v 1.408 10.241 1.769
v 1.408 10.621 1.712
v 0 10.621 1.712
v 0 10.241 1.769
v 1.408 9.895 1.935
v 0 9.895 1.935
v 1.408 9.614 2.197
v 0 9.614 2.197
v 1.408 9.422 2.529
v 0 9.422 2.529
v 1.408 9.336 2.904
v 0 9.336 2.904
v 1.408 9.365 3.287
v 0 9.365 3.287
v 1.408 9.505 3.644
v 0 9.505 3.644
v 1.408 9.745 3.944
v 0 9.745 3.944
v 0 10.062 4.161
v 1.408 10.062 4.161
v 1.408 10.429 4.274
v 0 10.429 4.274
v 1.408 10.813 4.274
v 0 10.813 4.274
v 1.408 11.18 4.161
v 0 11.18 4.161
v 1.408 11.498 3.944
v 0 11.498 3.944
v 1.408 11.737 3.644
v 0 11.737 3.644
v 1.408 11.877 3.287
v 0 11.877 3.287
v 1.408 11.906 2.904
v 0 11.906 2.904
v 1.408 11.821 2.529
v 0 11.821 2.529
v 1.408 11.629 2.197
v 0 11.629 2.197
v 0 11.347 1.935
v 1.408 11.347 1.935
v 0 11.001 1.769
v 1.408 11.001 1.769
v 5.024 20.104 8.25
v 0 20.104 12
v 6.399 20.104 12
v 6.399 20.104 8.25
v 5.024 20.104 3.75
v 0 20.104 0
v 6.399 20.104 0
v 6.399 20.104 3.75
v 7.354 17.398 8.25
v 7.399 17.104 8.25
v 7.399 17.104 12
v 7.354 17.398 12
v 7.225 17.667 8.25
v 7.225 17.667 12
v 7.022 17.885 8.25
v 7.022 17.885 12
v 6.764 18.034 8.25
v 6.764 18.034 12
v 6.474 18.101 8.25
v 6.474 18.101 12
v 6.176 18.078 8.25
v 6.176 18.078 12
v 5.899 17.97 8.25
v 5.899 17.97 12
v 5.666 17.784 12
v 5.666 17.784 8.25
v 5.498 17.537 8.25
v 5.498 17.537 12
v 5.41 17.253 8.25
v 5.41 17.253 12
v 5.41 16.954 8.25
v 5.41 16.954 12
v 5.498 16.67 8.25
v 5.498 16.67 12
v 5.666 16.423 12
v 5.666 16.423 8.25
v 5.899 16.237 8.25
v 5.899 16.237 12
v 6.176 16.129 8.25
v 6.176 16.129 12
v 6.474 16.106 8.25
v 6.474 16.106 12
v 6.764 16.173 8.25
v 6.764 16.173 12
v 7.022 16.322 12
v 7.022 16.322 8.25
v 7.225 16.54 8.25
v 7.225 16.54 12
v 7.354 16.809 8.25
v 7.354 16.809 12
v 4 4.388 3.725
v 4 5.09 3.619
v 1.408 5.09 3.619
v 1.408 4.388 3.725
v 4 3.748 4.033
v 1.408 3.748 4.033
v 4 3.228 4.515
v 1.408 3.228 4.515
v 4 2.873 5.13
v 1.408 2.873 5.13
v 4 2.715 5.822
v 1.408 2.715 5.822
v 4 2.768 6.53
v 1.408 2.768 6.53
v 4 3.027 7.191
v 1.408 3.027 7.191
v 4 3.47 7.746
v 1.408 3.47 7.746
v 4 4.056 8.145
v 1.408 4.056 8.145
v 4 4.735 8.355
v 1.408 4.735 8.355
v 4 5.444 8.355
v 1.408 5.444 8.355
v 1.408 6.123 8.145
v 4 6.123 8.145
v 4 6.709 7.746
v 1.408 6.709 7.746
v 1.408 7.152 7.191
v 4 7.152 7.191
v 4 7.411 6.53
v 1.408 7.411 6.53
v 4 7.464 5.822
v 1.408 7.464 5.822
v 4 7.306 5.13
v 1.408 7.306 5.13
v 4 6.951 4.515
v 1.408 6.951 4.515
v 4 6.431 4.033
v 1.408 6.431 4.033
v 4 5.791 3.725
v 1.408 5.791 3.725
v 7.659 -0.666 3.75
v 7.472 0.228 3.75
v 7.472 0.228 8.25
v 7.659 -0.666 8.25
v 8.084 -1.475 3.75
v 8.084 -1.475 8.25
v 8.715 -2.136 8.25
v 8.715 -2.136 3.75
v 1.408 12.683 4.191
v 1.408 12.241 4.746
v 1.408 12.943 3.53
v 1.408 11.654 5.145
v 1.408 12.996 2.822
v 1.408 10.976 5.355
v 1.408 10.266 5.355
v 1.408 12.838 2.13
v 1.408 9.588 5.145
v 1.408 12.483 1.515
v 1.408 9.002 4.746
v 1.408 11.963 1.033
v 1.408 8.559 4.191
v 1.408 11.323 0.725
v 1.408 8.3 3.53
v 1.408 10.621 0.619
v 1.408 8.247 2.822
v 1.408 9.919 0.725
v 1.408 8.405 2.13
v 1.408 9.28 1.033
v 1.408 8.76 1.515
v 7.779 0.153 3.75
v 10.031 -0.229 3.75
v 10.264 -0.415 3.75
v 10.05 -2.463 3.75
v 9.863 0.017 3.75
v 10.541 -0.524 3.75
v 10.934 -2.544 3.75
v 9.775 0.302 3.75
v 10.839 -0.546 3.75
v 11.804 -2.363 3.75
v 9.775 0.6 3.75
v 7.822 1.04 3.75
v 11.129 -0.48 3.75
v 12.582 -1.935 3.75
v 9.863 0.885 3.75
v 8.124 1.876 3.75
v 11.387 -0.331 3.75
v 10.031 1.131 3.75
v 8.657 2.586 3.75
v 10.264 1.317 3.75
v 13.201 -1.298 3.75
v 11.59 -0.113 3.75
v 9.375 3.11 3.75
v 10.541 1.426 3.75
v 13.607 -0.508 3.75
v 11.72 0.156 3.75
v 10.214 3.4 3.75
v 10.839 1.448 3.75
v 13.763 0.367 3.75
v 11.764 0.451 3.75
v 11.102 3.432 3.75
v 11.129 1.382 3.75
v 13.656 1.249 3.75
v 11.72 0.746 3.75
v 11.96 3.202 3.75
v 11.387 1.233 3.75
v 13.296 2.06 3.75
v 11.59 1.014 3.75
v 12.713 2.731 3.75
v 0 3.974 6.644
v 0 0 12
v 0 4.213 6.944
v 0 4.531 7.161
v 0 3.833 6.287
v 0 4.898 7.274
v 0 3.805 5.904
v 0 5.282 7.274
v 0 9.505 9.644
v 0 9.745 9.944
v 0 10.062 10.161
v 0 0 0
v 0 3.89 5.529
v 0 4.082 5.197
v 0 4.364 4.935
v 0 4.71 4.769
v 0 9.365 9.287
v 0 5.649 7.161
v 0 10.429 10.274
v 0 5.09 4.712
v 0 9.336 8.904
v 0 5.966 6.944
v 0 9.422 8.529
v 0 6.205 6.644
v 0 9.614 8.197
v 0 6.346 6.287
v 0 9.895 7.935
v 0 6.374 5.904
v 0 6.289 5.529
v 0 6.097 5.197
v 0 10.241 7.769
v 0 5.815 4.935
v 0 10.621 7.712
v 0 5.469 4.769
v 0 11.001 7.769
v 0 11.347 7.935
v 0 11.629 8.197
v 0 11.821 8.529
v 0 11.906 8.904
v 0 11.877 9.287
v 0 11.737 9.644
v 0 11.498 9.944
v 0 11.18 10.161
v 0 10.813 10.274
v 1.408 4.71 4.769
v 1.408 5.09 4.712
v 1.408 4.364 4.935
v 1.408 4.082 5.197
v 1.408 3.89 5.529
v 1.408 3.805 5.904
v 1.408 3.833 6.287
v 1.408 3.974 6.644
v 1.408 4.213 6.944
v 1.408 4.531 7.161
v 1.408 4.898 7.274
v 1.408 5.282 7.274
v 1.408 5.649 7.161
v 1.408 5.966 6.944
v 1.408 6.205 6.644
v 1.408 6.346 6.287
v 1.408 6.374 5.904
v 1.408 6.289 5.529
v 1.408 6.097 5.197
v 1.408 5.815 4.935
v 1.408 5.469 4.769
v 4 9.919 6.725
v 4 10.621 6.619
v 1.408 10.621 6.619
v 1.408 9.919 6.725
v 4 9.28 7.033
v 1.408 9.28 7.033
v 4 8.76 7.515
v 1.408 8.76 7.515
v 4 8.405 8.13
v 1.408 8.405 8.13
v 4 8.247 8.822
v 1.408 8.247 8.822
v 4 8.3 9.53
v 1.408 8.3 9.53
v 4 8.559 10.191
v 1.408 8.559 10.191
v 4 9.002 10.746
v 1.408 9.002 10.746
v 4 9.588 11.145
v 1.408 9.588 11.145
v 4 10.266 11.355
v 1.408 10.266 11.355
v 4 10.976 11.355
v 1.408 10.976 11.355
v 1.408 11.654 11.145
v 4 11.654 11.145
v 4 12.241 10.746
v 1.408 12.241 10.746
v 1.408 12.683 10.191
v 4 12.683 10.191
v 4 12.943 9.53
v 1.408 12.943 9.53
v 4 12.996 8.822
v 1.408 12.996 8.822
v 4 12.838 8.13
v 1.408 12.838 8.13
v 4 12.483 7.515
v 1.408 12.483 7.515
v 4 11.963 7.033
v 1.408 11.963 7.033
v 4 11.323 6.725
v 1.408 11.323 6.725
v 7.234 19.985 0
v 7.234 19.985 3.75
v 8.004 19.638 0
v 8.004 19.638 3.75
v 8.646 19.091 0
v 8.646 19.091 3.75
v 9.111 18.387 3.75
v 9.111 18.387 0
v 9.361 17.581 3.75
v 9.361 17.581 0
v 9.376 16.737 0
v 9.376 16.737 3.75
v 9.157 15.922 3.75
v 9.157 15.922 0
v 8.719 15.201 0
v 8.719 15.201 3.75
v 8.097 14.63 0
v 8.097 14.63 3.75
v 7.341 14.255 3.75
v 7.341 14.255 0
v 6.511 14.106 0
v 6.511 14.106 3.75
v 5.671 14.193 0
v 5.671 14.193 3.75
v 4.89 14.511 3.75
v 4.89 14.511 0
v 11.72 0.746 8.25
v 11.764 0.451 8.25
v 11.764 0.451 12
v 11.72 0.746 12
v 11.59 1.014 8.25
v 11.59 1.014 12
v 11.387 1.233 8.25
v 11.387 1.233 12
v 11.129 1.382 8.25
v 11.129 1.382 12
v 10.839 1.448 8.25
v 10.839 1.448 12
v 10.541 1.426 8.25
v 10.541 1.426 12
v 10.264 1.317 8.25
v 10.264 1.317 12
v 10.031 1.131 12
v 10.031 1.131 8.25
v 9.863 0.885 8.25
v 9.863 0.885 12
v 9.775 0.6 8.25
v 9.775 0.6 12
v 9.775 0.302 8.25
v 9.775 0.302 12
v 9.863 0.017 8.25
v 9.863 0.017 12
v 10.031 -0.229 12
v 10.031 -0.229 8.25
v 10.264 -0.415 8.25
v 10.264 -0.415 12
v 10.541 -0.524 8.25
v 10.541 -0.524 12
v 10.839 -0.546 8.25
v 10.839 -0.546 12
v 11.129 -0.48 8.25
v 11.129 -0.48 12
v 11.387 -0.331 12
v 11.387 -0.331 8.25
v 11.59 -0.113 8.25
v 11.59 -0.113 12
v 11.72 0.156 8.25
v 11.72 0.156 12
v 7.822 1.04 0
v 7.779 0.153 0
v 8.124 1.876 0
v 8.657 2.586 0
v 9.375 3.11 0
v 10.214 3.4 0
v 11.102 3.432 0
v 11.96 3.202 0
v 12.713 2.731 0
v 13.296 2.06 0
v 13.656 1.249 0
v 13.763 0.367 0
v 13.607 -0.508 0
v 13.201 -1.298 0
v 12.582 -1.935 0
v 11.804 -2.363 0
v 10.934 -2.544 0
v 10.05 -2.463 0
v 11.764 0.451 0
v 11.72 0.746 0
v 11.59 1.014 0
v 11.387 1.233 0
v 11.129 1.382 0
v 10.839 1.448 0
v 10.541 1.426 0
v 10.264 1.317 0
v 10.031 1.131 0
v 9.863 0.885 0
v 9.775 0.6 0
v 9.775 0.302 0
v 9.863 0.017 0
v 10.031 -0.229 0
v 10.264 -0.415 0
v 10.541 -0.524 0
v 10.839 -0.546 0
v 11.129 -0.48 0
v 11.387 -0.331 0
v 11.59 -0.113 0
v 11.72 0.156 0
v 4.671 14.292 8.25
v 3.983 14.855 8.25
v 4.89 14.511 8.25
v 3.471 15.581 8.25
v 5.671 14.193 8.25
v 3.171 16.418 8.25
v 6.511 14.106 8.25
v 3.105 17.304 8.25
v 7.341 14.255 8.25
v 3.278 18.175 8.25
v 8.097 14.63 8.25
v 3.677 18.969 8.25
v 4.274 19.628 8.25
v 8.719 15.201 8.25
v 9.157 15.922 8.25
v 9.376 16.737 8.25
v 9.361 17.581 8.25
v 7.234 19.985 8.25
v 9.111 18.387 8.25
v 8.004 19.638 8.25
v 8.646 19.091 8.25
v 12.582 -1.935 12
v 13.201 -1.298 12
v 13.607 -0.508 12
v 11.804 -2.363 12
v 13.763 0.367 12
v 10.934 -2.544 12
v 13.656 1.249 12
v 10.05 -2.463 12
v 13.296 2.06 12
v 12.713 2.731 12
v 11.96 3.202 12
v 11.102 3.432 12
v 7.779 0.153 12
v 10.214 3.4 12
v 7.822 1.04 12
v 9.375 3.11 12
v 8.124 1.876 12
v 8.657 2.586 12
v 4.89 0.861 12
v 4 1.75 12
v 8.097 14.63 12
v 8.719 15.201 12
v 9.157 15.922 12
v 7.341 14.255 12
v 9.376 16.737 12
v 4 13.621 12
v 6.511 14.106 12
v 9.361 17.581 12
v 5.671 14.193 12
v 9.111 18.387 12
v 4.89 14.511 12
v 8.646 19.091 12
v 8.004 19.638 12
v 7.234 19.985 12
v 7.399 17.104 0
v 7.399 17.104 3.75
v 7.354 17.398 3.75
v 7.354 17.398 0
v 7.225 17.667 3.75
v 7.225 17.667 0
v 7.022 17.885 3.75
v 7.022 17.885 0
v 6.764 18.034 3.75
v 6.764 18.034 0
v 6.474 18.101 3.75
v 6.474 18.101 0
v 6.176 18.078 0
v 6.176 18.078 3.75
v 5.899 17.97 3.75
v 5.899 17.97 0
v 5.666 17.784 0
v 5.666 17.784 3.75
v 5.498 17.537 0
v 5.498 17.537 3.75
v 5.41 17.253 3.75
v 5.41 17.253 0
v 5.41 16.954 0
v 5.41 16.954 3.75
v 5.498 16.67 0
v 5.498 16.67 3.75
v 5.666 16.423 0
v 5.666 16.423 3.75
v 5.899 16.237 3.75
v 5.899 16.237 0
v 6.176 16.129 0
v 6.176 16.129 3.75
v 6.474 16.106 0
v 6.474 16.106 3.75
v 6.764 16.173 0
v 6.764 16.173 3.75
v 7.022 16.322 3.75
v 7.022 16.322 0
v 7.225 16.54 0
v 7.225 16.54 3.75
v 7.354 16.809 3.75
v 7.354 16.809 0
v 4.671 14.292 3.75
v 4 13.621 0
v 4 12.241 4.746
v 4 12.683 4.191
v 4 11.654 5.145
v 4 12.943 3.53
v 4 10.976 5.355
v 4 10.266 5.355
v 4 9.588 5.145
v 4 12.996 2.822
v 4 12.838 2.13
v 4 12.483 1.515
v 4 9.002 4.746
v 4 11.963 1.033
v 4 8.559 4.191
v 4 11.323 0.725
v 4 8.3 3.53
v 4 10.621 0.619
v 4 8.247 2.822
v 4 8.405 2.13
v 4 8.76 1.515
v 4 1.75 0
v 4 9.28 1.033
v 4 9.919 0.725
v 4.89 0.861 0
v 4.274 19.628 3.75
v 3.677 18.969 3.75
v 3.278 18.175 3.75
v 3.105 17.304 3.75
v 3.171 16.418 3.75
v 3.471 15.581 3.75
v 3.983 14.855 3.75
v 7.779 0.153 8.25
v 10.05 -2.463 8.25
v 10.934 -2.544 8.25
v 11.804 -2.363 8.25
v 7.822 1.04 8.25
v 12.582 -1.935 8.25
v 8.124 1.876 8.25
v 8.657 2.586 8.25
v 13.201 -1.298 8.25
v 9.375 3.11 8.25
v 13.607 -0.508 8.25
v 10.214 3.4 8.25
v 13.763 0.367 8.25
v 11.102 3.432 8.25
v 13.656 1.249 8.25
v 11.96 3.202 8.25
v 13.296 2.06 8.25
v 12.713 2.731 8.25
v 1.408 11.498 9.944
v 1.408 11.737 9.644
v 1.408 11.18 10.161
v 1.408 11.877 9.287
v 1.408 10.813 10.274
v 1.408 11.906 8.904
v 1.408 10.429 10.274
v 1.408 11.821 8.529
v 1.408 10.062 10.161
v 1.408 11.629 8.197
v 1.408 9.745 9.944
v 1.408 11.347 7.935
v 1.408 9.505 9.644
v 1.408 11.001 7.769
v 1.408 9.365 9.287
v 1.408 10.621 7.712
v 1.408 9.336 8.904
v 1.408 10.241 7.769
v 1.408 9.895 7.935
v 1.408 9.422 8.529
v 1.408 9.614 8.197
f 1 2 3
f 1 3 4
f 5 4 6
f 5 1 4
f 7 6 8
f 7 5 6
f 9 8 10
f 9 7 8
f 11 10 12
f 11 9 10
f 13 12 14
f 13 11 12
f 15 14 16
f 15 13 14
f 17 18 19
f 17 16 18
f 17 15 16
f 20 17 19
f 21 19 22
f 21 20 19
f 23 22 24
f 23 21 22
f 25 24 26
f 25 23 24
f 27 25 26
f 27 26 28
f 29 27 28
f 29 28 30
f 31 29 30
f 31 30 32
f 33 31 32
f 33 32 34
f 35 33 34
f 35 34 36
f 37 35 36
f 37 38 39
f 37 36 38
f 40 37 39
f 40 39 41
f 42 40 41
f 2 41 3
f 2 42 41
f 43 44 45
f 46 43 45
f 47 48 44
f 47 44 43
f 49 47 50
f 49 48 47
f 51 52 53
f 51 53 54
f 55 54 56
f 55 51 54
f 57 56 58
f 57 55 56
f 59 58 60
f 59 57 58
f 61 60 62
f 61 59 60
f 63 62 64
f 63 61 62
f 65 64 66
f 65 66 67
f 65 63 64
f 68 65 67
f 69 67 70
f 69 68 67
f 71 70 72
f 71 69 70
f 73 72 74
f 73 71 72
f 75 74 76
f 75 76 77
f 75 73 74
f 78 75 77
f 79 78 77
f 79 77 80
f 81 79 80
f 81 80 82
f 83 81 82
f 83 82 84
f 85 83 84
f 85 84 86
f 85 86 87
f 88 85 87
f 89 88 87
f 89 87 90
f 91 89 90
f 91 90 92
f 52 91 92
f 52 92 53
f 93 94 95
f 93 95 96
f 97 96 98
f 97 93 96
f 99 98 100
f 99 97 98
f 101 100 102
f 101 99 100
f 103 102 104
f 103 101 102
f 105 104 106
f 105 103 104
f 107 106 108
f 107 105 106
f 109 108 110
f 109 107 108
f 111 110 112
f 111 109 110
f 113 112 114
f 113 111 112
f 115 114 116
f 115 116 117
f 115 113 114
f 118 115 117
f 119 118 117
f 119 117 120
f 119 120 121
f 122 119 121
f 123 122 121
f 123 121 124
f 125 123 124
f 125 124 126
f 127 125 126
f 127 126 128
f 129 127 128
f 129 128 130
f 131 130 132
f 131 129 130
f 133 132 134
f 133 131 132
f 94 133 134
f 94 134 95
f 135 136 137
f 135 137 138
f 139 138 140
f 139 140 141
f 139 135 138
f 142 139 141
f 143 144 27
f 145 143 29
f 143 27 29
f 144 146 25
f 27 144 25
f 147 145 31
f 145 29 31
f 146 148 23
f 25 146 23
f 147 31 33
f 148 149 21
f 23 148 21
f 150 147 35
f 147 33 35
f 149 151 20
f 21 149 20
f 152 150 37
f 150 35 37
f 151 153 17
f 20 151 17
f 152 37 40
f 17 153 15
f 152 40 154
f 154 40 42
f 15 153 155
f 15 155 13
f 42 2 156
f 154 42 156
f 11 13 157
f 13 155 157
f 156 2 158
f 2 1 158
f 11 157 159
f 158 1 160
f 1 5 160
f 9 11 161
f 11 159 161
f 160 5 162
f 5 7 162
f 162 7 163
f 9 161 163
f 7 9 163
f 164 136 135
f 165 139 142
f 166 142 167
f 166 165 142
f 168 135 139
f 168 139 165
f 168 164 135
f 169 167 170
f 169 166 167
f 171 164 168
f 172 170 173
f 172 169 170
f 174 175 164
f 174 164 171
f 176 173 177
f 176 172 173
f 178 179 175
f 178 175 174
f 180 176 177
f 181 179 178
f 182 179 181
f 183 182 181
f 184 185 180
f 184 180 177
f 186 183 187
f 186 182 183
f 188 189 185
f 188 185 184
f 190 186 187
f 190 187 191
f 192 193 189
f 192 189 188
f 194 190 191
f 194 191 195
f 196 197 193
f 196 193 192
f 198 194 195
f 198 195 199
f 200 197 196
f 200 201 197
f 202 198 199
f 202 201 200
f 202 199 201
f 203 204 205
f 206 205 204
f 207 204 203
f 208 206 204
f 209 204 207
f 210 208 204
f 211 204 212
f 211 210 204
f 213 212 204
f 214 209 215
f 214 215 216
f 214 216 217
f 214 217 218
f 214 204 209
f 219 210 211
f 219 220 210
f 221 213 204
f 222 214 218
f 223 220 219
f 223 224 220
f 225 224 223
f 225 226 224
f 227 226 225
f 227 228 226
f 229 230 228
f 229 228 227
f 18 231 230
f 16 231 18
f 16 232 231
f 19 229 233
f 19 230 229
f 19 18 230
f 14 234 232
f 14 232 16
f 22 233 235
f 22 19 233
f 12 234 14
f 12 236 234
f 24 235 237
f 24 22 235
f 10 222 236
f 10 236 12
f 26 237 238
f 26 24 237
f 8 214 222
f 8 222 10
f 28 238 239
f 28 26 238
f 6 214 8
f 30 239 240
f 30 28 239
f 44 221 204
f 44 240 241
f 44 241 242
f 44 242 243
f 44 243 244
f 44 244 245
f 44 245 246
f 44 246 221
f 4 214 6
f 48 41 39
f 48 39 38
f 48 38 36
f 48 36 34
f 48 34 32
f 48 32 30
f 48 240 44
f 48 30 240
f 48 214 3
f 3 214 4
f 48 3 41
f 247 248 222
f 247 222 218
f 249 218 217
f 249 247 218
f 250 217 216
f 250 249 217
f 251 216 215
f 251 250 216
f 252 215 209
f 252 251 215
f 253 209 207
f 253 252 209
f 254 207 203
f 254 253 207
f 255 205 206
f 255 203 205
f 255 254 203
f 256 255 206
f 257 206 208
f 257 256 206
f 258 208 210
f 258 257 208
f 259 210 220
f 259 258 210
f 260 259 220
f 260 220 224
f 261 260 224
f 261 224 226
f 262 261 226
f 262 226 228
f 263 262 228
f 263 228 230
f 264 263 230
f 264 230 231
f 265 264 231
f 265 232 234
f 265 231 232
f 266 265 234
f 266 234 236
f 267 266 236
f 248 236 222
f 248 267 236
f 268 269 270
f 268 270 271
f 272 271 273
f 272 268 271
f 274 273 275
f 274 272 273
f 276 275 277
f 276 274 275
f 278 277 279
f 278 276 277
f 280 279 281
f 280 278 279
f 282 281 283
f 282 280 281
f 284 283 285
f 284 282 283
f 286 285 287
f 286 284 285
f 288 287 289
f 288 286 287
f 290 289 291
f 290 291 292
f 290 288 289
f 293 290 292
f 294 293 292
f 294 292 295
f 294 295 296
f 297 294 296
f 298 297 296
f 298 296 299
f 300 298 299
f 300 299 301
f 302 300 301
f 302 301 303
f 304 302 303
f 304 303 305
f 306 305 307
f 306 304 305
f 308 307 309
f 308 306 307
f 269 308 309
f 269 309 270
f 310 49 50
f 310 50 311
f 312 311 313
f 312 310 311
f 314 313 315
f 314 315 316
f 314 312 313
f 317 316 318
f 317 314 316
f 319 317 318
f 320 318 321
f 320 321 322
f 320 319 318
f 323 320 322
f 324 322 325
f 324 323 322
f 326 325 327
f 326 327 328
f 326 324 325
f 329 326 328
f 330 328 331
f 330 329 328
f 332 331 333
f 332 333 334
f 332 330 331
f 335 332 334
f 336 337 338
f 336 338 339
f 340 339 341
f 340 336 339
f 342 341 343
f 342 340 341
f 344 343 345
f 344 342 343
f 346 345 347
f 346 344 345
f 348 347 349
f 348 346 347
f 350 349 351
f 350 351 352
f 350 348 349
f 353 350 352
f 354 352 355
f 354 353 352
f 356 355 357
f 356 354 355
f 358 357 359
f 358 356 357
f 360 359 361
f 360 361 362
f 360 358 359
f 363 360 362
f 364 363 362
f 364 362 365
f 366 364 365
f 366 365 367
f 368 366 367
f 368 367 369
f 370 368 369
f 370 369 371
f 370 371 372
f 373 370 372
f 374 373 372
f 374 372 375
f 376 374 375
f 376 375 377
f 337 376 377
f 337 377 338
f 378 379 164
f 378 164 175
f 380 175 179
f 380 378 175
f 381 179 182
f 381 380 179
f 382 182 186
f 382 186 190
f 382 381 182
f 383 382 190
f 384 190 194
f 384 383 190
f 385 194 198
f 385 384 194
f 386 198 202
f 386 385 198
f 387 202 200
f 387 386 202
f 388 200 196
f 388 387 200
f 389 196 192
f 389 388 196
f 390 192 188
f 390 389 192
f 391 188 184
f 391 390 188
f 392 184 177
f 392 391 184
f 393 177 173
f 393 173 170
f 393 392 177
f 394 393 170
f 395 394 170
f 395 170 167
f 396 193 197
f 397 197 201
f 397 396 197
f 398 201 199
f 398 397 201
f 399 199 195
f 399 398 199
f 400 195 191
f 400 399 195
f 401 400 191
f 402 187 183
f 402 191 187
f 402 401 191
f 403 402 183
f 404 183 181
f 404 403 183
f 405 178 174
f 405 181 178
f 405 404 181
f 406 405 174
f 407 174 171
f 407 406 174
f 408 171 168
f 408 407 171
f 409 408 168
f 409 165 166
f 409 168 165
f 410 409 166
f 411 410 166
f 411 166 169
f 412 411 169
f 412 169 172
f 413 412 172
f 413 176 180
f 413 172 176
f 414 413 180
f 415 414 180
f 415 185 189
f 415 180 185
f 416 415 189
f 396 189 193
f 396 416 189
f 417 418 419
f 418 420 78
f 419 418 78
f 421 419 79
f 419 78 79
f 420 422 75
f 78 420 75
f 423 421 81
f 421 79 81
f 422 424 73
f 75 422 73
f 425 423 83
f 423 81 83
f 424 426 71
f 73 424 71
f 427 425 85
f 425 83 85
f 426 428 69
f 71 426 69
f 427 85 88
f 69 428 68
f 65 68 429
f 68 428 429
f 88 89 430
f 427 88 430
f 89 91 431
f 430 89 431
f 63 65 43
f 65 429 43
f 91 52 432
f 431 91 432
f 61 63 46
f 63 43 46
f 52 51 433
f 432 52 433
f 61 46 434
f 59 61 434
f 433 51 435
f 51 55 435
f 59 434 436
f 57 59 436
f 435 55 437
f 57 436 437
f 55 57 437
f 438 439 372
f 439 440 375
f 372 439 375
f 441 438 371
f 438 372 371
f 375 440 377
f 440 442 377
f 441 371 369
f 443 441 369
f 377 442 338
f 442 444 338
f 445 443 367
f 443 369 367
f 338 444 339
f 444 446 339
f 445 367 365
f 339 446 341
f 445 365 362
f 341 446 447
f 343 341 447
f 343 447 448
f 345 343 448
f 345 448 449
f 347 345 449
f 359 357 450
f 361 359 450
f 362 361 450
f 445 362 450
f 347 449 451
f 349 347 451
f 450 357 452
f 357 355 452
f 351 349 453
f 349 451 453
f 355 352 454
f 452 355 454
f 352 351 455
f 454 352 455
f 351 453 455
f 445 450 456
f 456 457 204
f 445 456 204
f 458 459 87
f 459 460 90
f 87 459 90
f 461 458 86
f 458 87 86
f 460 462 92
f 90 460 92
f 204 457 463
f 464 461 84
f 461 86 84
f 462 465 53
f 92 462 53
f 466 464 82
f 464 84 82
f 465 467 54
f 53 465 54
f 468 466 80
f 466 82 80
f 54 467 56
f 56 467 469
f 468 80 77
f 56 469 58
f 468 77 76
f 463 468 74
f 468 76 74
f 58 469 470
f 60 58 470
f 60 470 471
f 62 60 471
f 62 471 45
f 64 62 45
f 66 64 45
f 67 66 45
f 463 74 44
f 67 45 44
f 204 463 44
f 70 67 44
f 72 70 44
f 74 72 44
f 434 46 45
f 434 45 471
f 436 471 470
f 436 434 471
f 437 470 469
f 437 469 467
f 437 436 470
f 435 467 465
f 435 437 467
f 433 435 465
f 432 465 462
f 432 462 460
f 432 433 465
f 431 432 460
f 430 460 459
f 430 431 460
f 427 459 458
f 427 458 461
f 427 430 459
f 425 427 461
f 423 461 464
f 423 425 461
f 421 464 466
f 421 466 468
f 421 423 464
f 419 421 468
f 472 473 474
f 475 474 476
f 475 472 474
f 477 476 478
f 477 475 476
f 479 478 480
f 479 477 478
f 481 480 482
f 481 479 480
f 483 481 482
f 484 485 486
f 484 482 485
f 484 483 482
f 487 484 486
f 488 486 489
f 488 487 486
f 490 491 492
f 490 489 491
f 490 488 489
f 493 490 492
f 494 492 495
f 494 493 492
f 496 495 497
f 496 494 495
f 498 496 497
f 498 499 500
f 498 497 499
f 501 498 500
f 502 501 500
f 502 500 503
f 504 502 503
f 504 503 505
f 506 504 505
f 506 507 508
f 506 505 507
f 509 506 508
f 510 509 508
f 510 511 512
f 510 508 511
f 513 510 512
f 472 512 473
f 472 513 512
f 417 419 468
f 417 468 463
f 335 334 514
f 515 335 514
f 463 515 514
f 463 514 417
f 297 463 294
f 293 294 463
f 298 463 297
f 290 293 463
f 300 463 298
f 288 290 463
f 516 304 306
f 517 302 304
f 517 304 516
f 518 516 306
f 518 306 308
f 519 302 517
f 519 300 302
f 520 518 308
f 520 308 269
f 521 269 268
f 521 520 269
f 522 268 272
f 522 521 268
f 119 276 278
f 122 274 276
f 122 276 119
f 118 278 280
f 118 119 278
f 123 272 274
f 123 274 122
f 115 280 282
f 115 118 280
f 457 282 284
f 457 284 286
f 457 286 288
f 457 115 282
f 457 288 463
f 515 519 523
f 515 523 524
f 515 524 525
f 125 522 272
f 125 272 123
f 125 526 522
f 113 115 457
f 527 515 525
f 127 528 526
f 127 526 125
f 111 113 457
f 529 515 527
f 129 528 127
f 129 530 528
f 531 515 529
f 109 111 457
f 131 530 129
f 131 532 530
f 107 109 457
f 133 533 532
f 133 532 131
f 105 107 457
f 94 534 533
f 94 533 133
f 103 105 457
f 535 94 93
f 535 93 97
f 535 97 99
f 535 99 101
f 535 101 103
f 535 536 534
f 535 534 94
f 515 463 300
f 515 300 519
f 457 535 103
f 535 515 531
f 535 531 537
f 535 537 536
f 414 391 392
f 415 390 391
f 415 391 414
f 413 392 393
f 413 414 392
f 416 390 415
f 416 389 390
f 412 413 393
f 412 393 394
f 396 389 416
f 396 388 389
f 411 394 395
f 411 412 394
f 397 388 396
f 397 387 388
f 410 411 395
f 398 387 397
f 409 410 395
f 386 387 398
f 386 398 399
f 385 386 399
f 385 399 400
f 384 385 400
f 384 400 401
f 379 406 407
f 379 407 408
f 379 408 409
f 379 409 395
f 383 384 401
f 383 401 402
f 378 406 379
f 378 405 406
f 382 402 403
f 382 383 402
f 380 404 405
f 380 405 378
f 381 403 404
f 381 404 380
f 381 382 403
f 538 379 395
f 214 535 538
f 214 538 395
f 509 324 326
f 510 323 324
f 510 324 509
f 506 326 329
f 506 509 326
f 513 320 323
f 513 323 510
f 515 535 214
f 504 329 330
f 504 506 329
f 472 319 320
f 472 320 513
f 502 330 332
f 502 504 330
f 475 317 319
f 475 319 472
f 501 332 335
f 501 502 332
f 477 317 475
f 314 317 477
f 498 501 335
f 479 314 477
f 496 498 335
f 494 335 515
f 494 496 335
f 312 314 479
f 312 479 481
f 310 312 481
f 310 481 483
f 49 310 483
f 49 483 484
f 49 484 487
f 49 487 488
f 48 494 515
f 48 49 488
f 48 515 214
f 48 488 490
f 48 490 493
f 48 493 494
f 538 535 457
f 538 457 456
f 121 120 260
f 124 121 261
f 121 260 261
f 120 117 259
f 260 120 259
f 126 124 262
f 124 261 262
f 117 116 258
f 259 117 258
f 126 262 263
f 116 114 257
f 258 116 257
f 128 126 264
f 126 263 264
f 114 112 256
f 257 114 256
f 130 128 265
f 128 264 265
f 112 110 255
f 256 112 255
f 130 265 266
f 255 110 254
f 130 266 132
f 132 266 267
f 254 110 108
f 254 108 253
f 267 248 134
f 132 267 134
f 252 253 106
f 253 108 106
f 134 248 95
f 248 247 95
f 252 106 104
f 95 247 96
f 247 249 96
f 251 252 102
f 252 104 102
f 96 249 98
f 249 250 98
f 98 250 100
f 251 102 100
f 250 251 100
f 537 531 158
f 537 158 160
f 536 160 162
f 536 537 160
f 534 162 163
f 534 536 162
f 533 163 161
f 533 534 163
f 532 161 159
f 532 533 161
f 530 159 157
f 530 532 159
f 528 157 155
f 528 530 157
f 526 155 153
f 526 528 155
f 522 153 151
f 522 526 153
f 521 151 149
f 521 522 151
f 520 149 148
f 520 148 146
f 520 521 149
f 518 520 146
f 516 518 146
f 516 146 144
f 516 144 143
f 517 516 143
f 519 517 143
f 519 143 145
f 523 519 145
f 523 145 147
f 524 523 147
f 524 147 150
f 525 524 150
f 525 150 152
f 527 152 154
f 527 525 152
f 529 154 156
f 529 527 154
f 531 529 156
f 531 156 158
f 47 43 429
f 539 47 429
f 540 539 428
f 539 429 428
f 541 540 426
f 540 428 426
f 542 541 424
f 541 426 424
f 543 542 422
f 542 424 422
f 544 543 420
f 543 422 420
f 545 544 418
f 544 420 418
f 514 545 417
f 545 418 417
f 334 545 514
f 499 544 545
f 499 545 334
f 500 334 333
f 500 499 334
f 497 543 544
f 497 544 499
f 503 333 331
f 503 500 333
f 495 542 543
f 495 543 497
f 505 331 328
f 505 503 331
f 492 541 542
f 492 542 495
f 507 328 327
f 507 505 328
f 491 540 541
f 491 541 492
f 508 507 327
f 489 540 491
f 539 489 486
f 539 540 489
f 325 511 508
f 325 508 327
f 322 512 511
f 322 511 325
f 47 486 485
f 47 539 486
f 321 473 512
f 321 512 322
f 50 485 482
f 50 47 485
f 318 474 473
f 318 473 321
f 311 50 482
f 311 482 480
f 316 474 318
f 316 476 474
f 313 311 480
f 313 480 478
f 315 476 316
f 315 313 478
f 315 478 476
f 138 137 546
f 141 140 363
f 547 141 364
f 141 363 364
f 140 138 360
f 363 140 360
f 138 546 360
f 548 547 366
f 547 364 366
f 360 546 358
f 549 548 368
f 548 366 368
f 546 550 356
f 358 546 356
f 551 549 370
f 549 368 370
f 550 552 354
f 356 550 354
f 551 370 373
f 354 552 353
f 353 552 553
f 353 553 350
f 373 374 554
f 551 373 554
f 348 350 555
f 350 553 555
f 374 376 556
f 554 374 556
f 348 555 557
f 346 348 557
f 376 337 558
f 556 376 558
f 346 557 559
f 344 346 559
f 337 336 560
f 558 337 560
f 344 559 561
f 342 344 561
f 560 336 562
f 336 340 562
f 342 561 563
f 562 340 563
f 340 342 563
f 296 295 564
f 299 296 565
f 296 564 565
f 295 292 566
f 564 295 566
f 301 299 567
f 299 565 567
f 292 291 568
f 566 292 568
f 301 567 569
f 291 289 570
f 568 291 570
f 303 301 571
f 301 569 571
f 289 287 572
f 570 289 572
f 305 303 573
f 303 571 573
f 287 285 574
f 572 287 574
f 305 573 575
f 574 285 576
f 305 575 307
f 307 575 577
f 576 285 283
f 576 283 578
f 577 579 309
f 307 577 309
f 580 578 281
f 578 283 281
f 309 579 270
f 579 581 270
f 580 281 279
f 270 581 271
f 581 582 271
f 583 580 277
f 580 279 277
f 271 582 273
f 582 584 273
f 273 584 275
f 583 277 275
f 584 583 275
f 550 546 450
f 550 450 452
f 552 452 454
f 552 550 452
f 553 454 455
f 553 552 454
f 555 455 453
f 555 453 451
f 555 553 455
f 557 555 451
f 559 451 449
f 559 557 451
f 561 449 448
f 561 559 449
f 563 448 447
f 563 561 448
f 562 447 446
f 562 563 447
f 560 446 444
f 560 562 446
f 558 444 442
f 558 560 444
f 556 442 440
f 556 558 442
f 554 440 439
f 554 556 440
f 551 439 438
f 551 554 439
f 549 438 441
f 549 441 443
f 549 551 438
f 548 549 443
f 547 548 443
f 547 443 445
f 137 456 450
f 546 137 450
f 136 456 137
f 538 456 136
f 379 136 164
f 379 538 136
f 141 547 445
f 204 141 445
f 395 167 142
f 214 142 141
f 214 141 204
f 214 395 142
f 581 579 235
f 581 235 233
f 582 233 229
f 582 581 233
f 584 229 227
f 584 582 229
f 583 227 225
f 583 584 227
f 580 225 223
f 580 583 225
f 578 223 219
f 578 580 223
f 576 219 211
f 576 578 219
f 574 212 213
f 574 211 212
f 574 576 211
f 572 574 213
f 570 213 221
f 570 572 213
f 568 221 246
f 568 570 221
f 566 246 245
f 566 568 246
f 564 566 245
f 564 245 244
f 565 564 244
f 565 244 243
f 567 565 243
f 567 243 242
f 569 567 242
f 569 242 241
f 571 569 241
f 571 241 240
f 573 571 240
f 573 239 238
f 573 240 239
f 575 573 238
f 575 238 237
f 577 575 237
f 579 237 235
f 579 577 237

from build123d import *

# Parameters (mm, degrees)
SKETCH_OPTIMIZATION_PARAMETERS_R = 1
BOSS_EXTRUDE1_DEPTH              = 12
SKETCH2_R                        = 3.3
CUT_EXTRUDE1_DEPTH               = 2.25
CUT_EXTRUDE1_DEPTH_BACK          = 2.25
HOLE_SKETCH_R                    = 1.288405797
SCREW_SHAFT_HOLES_DEPTH          = 5
SCREW_SHAFT_HOLES_DEPTH_BACK     = 10.763989156
SKETCH5_R                        = 2.38125
SCREW_COUNTERBORES_DEPTH         = 2.591836735


with BuildPart() as part:
    # Sketch-optimization parameters → Boss-Extrude1 (new body)
    with BuildSketch(Plane.XY):
        with BuildLine():
            Line((0, 0), (0, 20.103508611))
            Line((0, 20.103508611), (6.398918491, 20.103508611))
            ThreePointArc((6.398918491, 20.103508611), (9.29529716, 16.32184973), (4.889598418, 14.510835682))
            Line((4.889598418, 14.510835682), (4, 13.621237264))
            Line((4, 13.621237264), (4, 1.750446326))
            Line((4, 1.750446326), (4.889598418, 0.860847908))
            Line((4.889598418, 0.860847908), (7.778825692, 0.152757593))
            ThreePointArc((7.778825692, 0.152757593), (13.029319293, 2.417543543), (10.049883998, -2.463020336))
            Line((10.049883998, -2.463020336), (0, 0))
        make_face()
        with Locations((6.398918491, 17.103508611)):
            Circle(SKETCH_OPTIMIZATION_PARAMETERS_R, mode=Mode.SUBTRACT)
        with Locations((10.763989156, 0.450749356)):
            Circle(SKETCH_OPTIMIZATION_PARAMETERS_R, mode=Mode.SUBTRACT)
    extrude(amount=BOSS_EXTRUDE1_DEPTH)

    # Sketch2 → Cut-Extrude1 (cut, two sides)
    with BuildSketch(Plane.XY.offset(6)) as cut_extrude1_sk:
        with Locations((6.398918491, 17.103508611)):
            Circle(SKETCH2_R)
        with Locations((10.763989156, 0.450749356)):
            Circle(SKETCH2_R)
    extrude(amount=CUT_EXTRUDE1_DEPTH, mode=Mode.SUBTRACT)
    extrude(cut_extrude1_sk.sketch, amount=-CUT_EXTRUDE1_DEPTH_BACK, mode=Mode.SUBTRACT)

    # Hole sketch → Screw shaft holes (cut, two sides)
    with BuildSketch(Plane(origin=(4, 36.444645714, 0), x_dir=(0, 0, -1), z_dir=(-1, 0, 0))) as screw_shaft_holes_sk:
        with Locations((-9, 25.823408449)):
            Circle(HOLE_SKETCH_R)
        with Locations((-3, 25.823408449)):
            Circle(HOLE_SKETCH_R)
        with Locations((-6, 31.355067842)):
            Circle(HOLE_SKETCH_R)
    extrude(amount=SCREW_SHAFT_HOLES_DEPTH, mode=Mode.SUBTRACT)
    extrude(screw_shaft_holes_sk.sketch, amount=-SCREW_SHAFT_HOLES_DEPTH_BACK, mode=Mode.SUBTRACT)

    # Sketch5 → Screw counterbores (cut)
    with BuildSketch(Plane(origin=(4, 26.197134063, 0), x_dir=(0, 0, -1), z_dir=(-1, 0, 0))):
        with Locations((-6, 21.107556192)):
            Circle(SKETCH5_R)
        with Locations((-9, 15.575896799)):
            Circle(SKETCH5_R)
        with Locations((-3, 15.575896799)):
            Circle(SKETCH5_R)
    extrude(amount=SCREW_COUNTERBORES_DEPTH, mode=Mode.SUBTRACT)


solid = part.part
